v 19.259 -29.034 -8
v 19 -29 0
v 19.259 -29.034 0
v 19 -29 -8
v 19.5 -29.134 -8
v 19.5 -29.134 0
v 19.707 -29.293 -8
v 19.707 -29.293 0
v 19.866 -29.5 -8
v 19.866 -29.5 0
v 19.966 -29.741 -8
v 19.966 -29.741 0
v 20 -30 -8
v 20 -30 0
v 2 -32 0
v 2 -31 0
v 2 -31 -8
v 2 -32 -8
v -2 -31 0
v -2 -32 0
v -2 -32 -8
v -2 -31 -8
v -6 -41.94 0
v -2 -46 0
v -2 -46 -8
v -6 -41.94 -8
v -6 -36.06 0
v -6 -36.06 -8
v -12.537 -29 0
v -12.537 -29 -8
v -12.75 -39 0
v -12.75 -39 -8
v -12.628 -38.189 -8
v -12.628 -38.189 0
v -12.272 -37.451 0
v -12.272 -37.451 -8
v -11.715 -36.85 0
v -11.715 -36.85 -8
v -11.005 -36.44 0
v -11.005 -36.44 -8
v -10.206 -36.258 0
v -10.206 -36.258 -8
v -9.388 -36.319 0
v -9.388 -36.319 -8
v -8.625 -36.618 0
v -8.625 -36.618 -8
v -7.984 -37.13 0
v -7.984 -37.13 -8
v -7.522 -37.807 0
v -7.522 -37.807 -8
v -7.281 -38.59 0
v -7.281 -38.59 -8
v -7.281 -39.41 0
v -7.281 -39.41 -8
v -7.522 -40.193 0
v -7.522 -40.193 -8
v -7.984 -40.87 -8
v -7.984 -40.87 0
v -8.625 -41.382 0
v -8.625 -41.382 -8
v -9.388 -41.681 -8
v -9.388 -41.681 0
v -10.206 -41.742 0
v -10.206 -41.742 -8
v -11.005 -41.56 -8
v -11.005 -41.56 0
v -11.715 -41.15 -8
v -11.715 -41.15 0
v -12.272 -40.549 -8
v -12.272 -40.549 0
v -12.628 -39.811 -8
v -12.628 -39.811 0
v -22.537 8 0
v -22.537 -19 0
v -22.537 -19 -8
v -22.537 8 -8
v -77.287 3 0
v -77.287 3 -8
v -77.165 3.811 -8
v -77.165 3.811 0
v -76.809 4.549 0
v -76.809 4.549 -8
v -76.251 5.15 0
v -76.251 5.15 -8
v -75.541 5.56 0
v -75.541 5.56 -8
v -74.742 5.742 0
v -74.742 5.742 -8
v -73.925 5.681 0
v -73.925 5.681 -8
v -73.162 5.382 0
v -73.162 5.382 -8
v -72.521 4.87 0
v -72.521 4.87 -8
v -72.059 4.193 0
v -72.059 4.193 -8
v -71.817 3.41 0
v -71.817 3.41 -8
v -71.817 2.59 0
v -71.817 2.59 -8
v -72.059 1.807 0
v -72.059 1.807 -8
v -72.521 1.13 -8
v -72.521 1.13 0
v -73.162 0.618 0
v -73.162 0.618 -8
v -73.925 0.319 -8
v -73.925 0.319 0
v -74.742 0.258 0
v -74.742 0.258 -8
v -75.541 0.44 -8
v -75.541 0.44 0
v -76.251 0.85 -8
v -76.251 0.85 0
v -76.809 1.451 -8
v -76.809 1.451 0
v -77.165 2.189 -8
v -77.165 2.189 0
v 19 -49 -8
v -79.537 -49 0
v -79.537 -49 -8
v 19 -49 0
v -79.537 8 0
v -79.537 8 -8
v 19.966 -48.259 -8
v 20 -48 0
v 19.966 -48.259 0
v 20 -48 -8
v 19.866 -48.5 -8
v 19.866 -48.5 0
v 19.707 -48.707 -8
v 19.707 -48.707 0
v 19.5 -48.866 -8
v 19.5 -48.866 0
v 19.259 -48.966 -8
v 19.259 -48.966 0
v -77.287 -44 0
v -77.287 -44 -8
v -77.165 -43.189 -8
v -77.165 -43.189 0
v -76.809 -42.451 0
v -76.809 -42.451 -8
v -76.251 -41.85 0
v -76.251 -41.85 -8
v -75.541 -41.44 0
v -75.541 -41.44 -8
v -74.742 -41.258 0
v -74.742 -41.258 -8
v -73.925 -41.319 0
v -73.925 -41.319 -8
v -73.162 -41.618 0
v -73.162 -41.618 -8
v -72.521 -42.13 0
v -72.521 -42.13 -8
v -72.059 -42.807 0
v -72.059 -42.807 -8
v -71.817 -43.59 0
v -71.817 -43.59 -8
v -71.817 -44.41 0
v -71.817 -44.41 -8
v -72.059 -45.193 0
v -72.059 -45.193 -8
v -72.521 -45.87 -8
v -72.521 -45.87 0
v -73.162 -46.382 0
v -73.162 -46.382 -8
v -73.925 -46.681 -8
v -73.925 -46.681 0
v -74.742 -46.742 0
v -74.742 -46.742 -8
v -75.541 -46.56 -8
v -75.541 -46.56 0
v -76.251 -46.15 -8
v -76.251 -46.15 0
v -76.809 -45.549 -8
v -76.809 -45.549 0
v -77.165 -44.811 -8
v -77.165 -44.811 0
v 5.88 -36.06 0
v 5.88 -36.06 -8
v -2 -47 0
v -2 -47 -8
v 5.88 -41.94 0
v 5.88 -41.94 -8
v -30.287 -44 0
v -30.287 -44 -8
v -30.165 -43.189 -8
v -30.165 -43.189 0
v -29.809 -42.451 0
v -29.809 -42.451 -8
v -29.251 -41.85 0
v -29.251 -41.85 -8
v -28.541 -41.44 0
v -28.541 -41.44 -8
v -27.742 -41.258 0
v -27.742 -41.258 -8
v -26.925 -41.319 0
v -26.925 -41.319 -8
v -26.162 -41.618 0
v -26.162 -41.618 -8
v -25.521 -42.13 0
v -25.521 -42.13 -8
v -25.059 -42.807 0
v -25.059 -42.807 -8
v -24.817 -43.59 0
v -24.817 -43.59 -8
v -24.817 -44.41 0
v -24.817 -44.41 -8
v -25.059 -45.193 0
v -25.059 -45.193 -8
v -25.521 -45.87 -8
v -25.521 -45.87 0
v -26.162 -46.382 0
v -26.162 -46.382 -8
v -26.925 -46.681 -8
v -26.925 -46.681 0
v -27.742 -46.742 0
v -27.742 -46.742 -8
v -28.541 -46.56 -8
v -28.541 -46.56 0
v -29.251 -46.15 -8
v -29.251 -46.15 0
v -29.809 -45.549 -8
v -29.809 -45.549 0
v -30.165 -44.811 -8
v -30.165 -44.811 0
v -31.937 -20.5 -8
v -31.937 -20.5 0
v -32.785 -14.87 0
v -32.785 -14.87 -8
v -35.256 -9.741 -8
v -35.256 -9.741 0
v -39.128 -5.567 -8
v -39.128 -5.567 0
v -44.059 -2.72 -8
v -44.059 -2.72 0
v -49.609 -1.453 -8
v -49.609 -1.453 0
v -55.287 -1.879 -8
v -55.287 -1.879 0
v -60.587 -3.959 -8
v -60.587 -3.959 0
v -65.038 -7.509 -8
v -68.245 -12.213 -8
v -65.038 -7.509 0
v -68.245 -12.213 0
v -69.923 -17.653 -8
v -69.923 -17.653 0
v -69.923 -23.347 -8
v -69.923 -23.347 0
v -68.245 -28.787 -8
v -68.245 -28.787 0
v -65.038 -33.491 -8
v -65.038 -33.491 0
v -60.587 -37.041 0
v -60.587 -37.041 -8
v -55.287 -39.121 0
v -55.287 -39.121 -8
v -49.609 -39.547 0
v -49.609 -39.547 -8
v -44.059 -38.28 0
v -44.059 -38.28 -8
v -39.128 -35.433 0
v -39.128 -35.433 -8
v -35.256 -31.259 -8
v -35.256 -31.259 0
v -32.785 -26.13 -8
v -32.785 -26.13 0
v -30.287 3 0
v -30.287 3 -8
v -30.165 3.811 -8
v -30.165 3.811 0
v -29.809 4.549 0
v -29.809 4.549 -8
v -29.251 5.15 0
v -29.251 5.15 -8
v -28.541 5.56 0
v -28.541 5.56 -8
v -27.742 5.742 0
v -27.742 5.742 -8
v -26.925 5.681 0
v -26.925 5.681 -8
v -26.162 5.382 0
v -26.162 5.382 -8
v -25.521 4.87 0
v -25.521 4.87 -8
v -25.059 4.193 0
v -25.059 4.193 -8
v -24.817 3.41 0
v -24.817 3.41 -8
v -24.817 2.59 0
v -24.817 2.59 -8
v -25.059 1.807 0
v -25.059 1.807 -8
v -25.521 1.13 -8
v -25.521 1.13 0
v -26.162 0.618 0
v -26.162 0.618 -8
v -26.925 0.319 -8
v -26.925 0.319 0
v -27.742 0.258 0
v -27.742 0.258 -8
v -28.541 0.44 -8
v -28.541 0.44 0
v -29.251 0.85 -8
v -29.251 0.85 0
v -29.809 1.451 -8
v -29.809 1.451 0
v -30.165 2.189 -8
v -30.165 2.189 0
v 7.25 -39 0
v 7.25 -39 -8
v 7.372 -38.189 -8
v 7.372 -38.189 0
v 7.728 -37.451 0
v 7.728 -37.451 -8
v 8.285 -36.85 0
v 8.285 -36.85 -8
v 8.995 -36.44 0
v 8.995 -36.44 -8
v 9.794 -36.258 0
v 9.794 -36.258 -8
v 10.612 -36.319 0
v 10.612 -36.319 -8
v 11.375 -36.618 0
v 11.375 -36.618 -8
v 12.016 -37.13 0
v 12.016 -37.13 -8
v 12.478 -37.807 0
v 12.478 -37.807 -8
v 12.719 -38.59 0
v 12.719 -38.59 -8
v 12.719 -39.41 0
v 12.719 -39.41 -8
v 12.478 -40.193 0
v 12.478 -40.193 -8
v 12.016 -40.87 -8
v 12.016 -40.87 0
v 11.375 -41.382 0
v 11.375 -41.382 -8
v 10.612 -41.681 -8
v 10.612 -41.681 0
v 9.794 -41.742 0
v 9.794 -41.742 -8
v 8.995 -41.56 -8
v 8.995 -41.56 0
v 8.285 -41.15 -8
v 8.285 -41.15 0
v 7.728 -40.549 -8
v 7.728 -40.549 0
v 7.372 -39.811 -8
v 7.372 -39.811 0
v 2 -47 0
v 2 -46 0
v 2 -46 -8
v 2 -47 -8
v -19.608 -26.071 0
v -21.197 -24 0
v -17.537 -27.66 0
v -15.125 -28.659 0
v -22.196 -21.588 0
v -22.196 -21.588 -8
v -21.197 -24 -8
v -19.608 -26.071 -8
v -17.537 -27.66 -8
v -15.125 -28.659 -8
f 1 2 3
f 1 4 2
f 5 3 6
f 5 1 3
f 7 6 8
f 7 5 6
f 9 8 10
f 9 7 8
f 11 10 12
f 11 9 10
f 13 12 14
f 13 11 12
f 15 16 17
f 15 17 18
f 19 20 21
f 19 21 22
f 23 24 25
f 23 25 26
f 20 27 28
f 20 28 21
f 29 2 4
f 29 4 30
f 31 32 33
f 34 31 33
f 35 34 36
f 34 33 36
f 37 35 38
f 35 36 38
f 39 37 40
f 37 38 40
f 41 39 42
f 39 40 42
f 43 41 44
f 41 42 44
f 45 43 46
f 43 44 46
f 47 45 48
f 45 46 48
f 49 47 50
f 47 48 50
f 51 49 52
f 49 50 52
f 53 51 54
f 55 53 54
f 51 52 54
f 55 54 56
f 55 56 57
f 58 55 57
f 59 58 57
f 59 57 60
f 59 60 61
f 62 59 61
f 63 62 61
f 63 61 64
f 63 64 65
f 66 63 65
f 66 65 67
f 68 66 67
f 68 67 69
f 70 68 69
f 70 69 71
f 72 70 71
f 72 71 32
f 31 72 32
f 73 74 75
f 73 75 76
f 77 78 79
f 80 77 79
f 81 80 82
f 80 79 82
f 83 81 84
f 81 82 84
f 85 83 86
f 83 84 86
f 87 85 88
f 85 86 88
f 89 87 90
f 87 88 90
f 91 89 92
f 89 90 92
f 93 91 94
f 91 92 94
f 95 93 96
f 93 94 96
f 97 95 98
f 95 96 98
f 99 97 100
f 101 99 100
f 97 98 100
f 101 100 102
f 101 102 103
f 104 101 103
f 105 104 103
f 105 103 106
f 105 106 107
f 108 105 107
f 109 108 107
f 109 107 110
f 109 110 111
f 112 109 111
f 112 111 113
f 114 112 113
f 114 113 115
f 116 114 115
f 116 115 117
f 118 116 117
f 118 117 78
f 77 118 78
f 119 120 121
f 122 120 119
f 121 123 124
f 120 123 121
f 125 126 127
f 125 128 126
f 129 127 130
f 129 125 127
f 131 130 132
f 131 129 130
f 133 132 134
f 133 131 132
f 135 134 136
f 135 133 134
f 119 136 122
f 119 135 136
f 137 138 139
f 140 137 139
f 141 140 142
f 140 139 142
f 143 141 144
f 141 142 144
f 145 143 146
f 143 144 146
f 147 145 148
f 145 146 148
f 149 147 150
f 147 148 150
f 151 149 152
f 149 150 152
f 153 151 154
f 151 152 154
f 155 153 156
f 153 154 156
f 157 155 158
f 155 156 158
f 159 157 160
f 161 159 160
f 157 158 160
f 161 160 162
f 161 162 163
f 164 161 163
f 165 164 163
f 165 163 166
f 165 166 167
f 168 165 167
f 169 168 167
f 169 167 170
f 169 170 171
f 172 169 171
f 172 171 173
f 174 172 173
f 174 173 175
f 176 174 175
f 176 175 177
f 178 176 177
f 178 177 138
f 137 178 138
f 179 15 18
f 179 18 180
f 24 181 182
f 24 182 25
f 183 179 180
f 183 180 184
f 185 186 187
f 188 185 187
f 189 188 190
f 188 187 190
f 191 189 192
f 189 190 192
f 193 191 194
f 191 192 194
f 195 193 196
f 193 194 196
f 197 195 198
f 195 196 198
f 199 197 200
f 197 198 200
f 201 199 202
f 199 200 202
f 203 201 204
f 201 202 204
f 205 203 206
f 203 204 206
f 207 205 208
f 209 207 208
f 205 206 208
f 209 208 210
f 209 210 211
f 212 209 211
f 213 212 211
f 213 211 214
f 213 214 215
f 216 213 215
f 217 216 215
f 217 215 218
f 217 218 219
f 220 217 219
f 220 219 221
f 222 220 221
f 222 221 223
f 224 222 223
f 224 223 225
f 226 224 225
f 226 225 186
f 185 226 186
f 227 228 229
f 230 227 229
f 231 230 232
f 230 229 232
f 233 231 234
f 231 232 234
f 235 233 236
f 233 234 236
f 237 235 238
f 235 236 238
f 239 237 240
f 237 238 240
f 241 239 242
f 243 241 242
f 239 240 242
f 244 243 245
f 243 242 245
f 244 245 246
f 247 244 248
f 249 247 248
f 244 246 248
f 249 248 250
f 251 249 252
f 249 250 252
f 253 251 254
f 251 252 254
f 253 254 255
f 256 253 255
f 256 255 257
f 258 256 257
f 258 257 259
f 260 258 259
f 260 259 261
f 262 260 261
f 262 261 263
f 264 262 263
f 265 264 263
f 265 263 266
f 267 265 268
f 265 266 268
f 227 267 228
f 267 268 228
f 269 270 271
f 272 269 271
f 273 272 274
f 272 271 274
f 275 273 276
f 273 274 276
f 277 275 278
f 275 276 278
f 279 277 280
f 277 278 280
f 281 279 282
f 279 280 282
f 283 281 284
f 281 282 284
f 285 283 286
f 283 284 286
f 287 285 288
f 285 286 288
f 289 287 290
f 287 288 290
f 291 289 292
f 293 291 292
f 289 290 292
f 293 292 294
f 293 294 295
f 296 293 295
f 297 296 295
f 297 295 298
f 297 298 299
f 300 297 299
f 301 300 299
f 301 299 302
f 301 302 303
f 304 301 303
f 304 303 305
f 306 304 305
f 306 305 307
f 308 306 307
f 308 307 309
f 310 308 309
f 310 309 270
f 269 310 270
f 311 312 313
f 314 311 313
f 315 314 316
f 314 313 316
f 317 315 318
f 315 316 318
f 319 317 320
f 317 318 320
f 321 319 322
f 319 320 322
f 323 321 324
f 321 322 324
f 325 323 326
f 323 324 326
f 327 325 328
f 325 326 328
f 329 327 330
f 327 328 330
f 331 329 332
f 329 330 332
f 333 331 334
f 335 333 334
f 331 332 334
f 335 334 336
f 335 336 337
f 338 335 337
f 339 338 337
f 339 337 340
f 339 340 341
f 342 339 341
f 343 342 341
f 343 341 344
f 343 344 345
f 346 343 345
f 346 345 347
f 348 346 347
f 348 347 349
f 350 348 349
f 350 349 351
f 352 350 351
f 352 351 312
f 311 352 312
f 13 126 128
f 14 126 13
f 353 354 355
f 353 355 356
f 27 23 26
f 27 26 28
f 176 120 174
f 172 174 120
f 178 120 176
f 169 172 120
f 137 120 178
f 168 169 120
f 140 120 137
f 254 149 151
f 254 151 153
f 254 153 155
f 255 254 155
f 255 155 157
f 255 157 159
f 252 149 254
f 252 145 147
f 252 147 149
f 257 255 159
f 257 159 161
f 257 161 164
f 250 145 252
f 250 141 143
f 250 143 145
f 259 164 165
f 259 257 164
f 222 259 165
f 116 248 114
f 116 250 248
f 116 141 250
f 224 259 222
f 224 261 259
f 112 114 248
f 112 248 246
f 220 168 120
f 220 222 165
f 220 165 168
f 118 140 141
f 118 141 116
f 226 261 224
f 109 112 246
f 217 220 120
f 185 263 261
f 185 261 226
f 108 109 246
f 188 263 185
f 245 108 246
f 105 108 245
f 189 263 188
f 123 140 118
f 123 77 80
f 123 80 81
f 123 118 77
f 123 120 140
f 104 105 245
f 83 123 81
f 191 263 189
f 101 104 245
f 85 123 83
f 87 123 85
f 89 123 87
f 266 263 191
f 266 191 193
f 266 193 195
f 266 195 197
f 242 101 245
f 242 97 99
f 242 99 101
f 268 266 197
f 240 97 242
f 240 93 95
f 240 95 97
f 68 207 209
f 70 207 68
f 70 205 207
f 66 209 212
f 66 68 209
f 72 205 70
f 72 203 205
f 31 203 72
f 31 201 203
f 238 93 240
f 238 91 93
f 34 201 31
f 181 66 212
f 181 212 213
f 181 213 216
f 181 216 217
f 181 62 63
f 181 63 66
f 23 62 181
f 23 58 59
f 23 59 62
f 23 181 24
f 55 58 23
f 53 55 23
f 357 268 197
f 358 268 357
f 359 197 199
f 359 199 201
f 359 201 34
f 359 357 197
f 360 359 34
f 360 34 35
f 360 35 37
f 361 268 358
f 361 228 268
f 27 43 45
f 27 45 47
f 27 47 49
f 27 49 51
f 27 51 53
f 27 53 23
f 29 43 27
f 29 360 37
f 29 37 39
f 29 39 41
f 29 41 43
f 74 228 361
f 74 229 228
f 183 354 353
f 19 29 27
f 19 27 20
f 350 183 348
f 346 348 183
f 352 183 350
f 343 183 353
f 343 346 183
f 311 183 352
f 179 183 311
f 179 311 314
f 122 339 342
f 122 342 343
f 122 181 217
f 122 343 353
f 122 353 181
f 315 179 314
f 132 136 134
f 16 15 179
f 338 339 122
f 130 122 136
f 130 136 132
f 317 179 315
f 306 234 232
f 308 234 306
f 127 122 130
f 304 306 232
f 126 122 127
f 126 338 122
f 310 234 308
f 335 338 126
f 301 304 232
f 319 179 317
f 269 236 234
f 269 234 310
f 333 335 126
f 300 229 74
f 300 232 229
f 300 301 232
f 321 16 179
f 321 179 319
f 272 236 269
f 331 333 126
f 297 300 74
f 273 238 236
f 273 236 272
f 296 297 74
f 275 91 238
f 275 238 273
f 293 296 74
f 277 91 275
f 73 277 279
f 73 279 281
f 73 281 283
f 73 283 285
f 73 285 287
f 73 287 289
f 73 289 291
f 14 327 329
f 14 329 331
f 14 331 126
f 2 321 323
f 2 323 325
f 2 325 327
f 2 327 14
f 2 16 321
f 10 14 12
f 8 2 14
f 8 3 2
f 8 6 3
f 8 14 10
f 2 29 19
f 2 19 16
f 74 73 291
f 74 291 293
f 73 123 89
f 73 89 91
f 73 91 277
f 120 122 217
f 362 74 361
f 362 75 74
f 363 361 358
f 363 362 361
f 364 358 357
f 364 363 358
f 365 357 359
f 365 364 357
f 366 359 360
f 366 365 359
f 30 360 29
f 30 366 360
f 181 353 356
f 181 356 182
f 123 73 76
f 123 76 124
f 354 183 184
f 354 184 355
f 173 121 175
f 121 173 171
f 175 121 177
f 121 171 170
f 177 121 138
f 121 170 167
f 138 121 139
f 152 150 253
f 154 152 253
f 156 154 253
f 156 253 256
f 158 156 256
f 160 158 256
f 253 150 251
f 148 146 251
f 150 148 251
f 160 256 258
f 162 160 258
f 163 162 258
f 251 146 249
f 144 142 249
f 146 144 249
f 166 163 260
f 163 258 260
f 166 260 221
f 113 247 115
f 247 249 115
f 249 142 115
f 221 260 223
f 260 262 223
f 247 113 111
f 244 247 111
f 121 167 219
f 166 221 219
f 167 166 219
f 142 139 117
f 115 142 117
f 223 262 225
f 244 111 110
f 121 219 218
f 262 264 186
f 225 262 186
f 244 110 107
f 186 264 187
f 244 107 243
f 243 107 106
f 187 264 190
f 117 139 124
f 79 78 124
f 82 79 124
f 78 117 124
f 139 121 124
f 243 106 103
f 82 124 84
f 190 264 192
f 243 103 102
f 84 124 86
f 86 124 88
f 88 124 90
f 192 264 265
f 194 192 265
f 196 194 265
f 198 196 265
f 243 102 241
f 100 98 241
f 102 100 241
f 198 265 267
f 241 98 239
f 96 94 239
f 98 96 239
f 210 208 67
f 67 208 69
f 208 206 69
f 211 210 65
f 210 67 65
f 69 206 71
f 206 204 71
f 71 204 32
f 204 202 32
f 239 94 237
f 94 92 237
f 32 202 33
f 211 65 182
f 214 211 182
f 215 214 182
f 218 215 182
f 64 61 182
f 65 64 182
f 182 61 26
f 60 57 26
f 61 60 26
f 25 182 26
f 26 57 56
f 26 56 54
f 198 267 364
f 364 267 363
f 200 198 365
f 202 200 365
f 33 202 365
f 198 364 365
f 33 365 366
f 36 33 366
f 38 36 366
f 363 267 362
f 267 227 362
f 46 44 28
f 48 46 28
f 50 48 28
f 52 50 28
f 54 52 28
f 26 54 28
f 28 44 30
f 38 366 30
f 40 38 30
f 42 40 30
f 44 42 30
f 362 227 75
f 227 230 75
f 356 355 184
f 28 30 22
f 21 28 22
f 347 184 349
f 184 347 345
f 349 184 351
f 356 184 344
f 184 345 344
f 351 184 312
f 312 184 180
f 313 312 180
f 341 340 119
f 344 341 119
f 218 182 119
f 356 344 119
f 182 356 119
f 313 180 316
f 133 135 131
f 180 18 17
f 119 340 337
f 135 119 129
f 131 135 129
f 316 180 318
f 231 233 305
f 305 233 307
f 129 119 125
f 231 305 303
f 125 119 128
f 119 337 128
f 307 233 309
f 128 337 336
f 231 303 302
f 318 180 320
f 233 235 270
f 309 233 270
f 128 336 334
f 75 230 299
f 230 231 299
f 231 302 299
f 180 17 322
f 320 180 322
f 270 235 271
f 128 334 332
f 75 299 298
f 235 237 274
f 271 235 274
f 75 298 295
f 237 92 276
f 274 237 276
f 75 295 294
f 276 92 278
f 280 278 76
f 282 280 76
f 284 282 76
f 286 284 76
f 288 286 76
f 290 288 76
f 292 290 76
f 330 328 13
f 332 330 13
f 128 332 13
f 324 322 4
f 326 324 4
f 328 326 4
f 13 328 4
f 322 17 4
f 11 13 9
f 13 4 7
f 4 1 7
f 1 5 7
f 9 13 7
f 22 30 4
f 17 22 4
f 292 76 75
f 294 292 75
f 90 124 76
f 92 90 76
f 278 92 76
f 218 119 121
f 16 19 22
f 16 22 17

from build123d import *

# Parameters (mm, degrees)
STEPPER_PLATE_SKETCH_R   = 19.1
PLATE_BOSS_EXTRUDE_DEPTH = 8
FILLET1_R                = 10
FILLET2_R                = 1
M5_CLEARANCE_HOLE1_D     = 5.5


with BuildPart() as part:
    # Stepper Plate Sketch → Plate Boss-Extrude (new body)
    with BuildSketch(Plane.XY):
        Polygon((-22.536751464, 8), (-79.536751464, 8), (-79.536751464, -49), (20, -49), (20, -29), (-22.536751464, -29), align=None)
        with Locations((-51.036751464, -20.5)):
            Circle(STEPPER_PLATE_SKETCH_R, mode=Mode.SUBTRACT)
        Polygon((-2, -31), (2, -31), (2, -32), (5.88, -36.06), (5.88, -41.94), (2, -46), (2, -47), (-2, -47), (-2, -46), (-6, -41.94), (-6, -36.06), (-2, -32), align=None, mode=Mode.SUBTRACT)
    extrude(amount=-PLATE_BOSS_EXTRUDE_DEPTH)

    # Fillet1
    fillet1_edges = [part.edges().sort_by_distance(p)[0] for p in [
        (-22.536751464, -29, -4),
    ]]
    fillet(fillet1_edges, radius=FILLET1_R)

    # Fillet2
    fillet2_edges = [part.edges().sort_by_distance(p)[0] for p in [
        (20, -29, -4),
        (20, -49, -4),
    ]]
    fillet(fillet2_edges, radius=FILLET2_R)

    # M5 Clearance Hole1 (through all)
    with Locations(Plane.XY):
        with Locations((-74.536751464, 3), (-74.536751464, -44), (-27.536751464, -44), (-27.536751464, 3), (-10, -39), (10, -39)):
            Hole(M5_CLEARANCE_HOLE1_D / 2)


solid = part.part
